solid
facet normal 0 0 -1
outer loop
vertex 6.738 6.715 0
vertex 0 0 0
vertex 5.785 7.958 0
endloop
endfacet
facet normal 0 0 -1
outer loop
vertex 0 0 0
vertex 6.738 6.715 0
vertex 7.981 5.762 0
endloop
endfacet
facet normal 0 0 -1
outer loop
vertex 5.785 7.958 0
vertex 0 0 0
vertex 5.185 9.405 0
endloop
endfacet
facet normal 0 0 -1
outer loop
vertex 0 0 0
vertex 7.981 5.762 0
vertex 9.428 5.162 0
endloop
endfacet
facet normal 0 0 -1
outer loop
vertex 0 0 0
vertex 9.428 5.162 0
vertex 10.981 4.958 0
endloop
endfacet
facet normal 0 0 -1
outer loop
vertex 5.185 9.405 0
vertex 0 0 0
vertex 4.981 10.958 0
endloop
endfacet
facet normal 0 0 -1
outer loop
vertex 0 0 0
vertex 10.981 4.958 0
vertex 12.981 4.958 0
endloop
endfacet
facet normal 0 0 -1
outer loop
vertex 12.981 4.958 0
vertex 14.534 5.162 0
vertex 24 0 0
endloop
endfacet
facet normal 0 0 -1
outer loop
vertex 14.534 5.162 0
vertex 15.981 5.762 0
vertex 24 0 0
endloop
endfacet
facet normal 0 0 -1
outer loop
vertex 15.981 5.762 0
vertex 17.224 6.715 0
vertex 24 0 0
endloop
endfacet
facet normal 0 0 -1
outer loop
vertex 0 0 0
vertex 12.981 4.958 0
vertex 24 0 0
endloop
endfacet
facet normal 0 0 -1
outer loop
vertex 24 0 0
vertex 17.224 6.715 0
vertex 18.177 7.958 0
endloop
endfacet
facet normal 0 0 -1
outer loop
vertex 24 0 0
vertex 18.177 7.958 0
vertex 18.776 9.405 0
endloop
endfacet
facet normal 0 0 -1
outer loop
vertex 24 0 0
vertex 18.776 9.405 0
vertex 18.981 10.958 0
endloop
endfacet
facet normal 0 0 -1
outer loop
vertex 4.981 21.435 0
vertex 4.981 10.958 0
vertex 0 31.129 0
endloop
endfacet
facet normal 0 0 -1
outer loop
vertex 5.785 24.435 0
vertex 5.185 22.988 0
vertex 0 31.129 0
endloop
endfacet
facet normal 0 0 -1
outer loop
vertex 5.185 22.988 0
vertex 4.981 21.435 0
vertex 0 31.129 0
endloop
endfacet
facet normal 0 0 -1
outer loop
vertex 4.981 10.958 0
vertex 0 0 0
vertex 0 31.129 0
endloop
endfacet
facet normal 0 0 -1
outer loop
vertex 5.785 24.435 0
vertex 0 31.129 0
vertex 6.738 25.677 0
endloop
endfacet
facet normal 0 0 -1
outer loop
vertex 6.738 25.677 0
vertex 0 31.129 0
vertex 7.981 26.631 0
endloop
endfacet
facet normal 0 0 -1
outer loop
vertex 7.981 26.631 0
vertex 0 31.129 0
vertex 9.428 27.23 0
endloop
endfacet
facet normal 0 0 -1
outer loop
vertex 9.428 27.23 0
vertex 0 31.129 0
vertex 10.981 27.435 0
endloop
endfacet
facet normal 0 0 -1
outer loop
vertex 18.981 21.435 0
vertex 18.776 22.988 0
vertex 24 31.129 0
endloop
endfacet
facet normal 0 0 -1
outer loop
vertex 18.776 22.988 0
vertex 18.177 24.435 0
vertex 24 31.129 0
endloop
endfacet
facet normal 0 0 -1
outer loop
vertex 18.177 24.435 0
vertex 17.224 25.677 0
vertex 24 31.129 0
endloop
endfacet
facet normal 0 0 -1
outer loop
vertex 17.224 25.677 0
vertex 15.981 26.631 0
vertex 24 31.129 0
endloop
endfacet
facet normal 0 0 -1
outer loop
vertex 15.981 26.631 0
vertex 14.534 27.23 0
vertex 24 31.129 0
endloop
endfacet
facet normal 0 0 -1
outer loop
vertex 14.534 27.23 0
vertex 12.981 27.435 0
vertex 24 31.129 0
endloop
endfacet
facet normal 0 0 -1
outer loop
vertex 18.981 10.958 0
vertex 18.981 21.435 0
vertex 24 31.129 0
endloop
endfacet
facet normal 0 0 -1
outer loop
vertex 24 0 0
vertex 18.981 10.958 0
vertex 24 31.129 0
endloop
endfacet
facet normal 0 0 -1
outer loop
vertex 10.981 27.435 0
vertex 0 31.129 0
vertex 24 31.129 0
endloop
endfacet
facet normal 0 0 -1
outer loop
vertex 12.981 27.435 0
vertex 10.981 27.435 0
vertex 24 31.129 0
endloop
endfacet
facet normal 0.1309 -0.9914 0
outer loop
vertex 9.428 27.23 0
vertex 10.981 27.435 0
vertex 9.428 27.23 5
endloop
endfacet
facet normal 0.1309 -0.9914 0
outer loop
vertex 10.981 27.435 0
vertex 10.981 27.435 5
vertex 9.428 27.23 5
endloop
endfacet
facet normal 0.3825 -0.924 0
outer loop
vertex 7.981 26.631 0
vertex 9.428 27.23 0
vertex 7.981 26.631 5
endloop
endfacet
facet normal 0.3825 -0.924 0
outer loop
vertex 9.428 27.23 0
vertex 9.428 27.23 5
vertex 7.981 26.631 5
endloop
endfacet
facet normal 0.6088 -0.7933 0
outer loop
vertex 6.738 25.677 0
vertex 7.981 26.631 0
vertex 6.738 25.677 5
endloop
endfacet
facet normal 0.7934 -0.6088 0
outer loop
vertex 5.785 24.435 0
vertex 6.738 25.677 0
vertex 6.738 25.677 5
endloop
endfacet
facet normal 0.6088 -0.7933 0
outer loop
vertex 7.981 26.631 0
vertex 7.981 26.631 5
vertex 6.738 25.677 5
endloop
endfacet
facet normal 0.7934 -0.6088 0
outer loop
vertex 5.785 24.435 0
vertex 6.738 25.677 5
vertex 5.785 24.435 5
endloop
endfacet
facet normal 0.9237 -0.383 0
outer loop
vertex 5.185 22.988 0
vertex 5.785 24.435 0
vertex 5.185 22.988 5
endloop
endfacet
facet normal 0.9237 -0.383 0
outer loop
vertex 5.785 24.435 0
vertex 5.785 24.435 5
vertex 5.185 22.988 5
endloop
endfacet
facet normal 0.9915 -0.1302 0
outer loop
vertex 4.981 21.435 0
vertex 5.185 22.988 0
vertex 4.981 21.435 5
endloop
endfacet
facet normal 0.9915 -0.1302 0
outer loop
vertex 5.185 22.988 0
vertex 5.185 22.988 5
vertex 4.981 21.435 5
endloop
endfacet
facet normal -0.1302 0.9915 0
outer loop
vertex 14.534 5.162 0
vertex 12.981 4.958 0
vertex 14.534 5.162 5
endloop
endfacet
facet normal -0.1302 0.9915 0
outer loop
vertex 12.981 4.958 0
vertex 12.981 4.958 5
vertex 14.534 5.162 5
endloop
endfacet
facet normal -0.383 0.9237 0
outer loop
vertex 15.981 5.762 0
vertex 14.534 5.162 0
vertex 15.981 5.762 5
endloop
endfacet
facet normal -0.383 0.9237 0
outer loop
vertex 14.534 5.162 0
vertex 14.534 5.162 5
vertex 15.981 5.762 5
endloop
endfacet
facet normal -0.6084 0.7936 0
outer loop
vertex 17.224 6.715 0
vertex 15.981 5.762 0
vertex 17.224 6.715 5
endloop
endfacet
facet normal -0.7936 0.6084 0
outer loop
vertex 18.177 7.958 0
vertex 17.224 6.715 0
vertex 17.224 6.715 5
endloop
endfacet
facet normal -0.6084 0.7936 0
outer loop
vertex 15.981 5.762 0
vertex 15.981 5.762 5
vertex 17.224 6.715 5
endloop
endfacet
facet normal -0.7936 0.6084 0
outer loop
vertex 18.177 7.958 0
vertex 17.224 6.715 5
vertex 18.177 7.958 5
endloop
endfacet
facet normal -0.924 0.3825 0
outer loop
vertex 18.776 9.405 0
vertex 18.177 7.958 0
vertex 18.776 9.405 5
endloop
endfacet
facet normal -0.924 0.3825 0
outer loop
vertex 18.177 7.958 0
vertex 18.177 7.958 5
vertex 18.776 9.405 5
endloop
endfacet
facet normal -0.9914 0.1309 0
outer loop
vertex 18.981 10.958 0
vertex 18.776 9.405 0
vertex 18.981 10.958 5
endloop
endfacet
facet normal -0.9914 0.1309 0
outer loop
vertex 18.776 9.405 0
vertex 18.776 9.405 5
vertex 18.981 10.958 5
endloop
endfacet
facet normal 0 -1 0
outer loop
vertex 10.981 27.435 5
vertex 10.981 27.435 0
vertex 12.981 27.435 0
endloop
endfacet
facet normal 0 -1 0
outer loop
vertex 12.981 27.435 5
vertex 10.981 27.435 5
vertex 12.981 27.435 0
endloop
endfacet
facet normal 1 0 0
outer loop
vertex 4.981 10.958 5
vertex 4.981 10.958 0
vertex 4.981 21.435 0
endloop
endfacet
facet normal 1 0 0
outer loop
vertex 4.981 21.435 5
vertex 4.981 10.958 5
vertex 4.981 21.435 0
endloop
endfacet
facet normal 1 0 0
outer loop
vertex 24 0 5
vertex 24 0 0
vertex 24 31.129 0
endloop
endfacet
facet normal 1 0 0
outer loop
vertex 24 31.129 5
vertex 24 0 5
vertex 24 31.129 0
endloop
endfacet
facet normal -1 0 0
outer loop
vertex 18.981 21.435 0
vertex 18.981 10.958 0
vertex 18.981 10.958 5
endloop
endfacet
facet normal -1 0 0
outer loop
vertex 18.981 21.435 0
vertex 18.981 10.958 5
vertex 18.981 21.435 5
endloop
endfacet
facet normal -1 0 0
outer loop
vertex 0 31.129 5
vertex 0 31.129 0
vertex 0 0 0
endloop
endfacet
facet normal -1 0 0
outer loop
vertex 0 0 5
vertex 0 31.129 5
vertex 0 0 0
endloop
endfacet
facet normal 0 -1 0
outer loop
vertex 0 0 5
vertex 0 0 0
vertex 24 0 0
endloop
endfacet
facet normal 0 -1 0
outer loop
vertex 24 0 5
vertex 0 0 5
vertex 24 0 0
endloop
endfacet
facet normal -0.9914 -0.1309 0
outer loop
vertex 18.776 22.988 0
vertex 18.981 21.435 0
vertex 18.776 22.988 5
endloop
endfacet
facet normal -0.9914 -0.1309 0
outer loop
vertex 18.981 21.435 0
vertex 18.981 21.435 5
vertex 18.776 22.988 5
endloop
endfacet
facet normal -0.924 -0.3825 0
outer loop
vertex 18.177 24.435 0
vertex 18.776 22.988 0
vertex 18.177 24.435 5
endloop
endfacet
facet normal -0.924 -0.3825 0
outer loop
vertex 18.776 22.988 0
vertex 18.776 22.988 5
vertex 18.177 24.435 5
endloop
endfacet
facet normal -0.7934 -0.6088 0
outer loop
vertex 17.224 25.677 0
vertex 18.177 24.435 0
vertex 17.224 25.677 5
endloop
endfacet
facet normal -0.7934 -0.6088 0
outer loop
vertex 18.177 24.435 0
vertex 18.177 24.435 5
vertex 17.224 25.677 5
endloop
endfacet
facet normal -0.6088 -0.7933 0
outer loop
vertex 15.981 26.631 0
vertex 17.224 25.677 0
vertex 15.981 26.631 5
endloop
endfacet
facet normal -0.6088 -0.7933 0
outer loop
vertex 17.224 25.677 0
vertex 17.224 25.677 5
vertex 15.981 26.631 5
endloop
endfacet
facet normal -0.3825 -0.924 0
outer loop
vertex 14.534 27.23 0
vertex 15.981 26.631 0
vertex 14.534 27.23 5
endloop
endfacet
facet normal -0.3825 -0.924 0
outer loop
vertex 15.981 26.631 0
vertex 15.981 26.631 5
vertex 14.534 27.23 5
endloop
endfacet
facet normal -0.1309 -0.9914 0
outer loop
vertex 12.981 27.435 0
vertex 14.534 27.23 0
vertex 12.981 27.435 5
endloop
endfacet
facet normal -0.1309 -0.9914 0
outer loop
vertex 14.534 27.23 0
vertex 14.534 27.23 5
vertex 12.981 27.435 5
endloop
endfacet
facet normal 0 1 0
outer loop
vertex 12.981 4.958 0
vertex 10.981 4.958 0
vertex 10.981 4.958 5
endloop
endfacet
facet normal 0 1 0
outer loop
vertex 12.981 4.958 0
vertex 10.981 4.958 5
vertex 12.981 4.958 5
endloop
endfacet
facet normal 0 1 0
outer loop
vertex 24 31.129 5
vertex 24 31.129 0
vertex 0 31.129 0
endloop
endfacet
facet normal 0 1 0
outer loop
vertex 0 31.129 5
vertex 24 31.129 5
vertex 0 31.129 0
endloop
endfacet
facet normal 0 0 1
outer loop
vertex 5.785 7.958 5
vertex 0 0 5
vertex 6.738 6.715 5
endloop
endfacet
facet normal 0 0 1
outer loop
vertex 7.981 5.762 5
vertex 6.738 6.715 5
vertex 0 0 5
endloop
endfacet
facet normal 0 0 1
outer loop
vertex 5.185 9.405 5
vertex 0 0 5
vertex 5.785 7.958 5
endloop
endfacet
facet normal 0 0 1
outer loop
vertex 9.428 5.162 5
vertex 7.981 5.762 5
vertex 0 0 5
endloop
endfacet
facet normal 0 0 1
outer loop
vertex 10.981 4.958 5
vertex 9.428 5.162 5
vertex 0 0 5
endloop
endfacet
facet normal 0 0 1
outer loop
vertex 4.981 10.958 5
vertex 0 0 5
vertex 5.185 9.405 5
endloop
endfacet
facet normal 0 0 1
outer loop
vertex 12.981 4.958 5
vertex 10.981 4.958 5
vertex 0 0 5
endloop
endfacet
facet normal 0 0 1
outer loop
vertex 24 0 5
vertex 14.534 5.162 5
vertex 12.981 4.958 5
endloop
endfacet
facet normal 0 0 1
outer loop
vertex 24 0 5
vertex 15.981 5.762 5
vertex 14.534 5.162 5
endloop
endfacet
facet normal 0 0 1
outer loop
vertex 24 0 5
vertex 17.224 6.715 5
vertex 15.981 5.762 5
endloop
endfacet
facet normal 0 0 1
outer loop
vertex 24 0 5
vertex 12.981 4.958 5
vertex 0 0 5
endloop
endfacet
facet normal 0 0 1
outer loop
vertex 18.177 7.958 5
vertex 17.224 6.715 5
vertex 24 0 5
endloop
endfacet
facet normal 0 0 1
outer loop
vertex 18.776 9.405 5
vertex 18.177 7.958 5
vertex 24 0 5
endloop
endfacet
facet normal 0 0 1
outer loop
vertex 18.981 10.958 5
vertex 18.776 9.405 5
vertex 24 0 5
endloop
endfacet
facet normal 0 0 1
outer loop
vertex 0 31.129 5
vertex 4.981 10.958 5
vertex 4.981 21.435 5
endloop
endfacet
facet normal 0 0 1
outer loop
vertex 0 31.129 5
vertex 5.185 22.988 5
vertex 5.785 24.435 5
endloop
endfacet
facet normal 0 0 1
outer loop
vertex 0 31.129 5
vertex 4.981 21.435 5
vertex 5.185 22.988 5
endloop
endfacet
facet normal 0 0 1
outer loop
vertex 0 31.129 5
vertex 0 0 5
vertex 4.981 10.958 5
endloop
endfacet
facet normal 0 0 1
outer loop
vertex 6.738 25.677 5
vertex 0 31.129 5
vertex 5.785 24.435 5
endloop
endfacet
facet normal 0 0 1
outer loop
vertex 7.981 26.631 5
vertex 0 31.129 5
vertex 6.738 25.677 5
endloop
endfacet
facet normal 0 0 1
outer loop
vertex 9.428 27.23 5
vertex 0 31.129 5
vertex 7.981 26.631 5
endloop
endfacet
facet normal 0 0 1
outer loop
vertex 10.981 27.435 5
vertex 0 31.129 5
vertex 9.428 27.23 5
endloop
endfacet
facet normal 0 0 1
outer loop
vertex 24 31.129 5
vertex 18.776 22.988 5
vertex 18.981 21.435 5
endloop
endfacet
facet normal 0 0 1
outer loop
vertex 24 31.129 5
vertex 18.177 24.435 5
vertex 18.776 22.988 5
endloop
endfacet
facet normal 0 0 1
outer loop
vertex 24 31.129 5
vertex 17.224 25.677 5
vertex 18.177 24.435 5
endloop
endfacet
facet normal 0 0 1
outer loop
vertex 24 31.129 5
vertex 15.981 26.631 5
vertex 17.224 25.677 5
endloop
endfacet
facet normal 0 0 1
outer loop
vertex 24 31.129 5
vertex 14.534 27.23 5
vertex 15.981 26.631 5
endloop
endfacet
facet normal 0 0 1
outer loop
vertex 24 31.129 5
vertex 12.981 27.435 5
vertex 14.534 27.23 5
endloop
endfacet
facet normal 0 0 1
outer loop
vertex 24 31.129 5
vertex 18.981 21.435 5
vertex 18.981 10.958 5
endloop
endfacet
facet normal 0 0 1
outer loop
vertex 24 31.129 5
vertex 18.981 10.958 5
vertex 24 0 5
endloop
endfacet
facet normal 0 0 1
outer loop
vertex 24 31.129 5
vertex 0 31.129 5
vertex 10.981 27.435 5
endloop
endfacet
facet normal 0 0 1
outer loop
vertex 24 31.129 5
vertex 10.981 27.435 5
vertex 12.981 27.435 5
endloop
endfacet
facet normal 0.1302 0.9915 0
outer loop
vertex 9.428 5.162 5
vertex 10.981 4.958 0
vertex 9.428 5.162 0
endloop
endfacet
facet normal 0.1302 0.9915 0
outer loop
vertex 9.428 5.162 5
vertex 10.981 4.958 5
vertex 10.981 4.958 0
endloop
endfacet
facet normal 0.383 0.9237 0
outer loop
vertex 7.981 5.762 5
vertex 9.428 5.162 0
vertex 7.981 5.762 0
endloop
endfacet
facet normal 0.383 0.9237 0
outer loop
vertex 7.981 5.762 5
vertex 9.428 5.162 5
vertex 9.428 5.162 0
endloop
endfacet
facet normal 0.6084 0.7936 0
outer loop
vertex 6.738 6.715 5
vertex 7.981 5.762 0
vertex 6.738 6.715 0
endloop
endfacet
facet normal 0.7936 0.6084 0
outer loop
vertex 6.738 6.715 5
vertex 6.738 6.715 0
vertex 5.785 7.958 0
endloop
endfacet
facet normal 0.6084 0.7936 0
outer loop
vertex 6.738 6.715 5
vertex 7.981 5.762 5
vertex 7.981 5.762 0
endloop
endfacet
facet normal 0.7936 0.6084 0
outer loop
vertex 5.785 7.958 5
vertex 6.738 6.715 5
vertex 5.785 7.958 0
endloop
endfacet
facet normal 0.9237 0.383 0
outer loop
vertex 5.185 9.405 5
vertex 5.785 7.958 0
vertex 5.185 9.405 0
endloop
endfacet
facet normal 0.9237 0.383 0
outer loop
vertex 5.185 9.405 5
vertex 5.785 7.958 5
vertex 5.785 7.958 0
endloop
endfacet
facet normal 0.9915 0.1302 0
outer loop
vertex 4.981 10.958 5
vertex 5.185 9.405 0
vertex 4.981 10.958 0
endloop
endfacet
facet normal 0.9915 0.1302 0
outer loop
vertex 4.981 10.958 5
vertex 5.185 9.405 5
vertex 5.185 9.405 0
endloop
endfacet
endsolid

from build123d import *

# Parameters (mm, degrees)
F0_W     = 14
F0_H     = 22.477162
F1_DEPTH = 5
F2_R     = 6


with BuildPart() as f1:
    # F0 (on Top) → F1 (new body)
    with BuildSketch(Plane.XY):
        Polygon((0, 31.128641), (0, 0), (4.980863, 0), (24, 0), (24, 31.128641), align=None)
        with Locations((11.980863, 16.196262)):
            Rectangle(F0_W, F0_H, mode=Mode.SUBTRACT)
    extrude(amount=F1_DEPTH)

    # F2
    f2_edges = [f1.edges().sort_by_distance(p)[0] for p in [
        (4.980863, 27.434843, 2.5),
        (4.980863, 4.957681, 2.5),
        (18.980863, 4.957681, 2.5),
        (18.980863, 27.434843, 2.5),
    ]]
    fillet(f2_edges, radius=F2_R)


solid = f1.part
